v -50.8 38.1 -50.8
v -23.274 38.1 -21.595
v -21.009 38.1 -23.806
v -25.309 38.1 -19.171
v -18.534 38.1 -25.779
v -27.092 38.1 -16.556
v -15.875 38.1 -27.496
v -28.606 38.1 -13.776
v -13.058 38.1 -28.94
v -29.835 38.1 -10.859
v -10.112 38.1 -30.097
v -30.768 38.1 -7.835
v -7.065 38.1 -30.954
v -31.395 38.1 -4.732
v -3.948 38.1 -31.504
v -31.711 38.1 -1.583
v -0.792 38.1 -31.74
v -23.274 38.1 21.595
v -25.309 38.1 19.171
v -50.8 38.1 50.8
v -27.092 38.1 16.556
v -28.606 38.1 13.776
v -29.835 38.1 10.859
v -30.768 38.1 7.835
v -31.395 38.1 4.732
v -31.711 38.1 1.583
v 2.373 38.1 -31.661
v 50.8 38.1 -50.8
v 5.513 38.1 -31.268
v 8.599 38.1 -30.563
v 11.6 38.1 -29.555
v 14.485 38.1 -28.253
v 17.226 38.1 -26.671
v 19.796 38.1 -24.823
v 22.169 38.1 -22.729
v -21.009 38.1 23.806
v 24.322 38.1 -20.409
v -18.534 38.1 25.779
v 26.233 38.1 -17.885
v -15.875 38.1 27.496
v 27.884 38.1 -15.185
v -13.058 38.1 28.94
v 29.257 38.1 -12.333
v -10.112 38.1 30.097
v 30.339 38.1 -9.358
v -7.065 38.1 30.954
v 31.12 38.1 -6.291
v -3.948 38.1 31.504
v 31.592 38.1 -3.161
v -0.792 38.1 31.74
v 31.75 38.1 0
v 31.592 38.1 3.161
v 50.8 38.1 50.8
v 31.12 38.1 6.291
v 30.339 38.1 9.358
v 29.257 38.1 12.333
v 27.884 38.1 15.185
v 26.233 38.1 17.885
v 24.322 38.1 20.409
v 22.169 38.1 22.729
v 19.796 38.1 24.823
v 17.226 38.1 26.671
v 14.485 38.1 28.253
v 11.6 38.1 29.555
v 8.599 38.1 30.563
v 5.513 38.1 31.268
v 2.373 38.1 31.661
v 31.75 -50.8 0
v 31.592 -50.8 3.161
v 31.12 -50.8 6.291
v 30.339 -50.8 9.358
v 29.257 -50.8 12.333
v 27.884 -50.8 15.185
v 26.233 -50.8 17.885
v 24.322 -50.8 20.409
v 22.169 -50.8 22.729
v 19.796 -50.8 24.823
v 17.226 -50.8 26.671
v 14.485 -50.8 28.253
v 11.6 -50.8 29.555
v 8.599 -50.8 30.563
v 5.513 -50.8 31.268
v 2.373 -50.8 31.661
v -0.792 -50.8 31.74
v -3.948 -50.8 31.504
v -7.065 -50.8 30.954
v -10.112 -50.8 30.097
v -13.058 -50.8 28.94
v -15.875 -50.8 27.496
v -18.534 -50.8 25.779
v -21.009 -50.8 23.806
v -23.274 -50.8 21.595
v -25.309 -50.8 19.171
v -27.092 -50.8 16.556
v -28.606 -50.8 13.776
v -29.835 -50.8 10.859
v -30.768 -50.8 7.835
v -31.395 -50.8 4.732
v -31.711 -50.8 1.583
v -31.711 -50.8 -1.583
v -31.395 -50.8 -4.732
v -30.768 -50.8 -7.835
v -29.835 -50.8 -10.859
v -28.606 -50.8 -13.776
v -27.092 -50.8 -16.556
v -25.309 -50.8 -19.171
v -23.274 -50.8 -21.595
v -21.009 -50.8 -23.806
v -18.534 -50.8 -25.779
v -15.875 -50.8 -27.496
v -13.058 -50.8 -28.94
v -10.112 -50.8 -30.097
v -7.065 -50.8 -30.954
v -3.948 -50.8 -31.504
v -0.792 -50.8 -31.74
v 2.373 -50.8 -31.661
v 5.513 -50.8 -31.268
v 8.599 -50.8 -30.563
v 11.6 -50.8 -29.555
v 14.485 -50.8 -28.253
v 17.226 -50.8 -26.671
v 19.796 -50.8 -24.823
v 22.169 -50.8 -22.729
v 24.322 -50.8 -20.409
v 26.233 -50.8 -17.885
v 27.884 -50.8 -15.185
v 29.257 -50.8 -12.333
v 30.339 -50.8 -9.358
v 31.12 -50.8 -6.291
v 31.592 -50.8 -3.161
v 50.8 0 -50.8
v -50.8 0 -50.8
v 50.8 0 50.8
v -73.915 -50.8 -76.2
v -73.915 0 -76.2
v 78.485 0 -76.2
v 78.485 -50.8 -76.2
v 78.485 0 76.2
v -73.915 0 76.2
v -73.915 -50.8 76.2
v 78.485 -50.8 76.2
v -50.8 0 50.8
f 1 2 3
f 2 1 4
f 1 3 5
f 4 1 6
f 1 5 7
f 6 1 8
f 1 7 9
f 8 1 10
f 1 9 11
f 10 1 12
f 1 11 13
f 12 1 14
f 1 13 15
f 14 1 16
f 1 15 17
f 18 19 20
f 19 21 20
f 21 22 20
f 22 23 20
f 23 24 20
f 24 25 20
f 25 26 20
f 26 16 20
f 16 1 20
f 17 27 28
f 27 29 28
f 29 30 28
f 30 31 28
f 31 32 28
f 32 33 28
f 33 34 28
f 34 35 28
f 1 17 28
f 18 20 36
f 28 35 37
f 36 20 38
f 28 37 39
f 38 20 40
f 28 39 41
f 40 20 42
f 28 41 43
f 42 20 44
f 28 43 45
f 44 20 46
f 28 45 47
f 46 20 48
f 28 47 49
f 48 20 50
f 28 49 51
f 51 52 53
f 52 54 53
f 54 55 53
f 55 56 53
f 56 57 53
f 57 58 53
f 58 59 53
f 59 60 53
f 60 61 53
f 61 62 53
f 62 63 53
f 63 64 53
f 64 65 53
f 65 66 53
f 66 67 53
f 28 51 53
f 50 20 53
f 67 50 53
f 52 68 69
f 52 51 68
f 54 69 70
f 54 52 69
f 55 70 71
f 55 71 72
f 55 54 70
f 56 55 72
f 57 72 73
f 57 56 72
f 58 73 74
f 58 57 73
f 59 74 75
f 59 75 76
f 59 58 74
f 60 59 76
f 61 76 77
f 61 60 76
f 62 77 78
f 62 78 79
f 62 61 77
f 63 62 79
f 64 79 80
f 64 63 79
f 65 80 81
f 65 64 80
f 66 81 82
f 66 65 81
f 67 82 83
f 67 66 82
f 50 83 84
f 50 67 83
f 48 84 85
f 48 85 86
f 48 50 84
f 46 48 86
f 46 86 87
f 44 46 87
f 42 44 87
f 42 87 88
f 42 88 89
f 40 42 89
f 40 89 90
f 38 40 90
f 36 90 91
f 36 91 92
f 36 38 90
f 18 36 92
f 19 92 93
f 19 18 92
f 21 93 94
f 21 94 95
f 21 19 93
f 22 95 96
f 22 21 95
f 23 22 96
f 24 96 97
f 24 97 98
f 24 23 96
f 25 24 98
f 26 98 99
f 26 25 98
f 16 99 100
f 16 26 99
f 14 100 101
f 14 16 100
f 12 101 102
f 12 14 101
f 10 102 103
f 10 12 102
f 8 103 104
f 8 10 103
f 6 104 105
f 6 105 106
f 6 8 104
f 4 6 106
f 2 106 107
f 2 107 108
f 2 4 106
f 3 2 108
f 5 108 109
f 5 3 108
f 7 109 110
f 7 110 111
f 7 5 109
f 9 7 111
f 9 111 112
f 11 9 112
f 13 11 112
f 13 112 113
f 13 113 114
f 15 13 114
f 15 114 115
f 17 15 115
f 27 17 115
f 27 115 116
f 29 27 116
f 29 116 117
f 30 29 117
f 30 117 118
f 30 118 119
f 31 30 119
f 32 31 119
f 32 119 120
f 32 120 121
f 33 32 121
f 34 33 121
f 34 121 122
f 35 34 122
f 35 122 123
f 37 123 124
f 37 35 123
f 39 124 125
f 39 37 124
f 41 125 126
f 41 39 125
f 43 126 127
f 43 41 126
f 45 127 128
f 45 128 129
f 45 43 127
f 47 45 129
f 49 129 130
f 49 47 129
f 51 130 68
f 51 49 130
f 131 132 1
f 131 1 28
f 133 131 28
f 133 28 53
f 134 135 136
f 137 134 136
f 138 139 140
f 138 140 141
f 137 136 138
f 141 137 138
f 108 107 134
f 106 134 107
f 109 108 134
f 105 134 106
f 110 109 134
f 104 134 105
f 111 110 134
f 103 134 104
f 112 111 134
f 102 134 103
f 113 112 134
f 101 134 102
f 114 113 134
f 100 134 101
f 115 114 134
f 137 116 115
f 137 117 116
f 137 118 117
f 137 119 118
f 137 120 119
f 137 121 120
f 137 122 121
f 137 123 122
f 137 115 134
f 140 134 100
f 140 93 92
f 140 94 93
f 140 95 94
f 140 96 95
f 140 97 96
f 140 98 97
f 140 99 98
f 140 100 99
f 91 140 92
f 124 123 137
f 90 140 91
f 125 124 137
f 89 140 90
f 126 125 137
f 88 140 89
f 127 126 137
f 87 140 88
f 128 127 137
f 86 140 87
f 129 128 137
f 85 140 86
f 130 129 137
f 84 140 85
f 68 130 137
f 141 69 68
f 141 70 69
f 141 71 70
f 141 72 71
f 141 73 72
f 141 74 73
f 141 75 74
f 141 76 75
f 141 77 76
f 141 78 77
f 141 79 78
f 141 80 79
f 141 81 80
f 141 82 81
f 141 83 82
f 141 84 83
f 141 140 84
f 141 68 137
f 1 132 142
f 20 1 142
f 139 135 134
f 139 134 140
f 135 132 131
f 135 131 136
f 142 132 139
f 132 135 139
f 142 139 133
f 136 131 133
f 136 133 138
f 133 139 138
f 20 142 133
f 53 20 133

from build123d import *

# Parameters (mm, degrees)
F0_W     = 101.6
F0_H     = 101.6
F0_R     = 31.75
F1_DEPTH = 38.1
F0_W_2   = 152.4
F0_H_2   = 152.4
F2_DEPTH = 50.8


with BuildPart() as f1:
    # F0 (on Front) → F1 (new body)
    with BuildSketch(Plane.XZ):
        Rectangle(F0_W, F0_H)
        Circle(F0_R, mode=Mode.SUBTRACT)
    extrude(amount=-F1_DEPTH)

    # F0 (on Front) → F2 (join)
    with BuildSketch(Plane.XZ):
        with Locations((2.284581, 0)):
            Rectangle(F0_W_2, F0_H_2)
        Rectangle(F0_W, F0_H, mode=Mode.SUBTRACT)
        Rectangle(F0_W, F0_H)
        Circle(F0_R, mode=Mode.SUBTRACT)
    extrude(amount=F2_DEPTH)


solid = f1.part
